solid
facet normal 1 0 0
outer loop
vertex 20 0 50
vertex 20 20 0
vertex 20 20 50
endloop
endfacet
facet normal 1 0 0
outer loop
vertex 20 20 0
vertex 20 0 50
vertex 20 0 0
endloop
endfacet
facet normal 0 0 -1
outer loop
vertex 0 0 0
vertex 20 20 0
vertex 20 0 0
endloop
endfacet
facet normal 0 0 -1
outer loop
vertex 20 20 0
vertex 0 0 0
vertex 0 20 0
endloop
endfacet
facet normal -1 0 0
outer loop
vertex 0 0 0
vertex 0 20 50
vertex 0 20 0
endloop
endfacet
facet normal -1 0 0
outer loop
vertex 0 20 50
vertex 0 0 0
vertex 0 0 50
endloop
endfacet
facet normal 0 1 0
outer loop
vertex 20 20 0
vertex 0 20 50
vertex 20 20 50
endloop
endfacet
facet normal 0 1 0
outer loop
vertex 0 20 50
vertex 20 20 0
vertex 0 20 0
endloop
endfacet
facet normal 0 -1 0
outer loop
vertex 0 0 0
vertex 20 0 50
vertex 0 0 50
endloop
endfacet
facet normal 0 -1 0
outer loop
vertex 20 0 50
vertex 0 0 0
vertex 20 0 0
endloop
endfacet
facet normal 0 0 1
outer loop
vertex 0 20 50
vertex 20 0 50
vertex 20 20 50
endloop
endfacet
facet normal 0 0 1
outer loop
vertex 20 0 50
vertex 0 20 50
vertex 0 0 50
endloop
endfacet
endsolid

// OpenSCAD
/* Simple temperature tower with labels (manually assign temps per segment) */
module segment(h, label){
  cube([20,20,h], center=false);
  translate([2,2,h-1]) linear_extrude(1) text(label, size=4);
}
translate([0,0,0]) segment(10,"210");
translate([0,0,10]) segment(10,"205");
translate([0,0,20]) segment(10,"200");
translate([0,0,30]) segment(10,"195");
translate([0,0,40]) segment(10,"190");
